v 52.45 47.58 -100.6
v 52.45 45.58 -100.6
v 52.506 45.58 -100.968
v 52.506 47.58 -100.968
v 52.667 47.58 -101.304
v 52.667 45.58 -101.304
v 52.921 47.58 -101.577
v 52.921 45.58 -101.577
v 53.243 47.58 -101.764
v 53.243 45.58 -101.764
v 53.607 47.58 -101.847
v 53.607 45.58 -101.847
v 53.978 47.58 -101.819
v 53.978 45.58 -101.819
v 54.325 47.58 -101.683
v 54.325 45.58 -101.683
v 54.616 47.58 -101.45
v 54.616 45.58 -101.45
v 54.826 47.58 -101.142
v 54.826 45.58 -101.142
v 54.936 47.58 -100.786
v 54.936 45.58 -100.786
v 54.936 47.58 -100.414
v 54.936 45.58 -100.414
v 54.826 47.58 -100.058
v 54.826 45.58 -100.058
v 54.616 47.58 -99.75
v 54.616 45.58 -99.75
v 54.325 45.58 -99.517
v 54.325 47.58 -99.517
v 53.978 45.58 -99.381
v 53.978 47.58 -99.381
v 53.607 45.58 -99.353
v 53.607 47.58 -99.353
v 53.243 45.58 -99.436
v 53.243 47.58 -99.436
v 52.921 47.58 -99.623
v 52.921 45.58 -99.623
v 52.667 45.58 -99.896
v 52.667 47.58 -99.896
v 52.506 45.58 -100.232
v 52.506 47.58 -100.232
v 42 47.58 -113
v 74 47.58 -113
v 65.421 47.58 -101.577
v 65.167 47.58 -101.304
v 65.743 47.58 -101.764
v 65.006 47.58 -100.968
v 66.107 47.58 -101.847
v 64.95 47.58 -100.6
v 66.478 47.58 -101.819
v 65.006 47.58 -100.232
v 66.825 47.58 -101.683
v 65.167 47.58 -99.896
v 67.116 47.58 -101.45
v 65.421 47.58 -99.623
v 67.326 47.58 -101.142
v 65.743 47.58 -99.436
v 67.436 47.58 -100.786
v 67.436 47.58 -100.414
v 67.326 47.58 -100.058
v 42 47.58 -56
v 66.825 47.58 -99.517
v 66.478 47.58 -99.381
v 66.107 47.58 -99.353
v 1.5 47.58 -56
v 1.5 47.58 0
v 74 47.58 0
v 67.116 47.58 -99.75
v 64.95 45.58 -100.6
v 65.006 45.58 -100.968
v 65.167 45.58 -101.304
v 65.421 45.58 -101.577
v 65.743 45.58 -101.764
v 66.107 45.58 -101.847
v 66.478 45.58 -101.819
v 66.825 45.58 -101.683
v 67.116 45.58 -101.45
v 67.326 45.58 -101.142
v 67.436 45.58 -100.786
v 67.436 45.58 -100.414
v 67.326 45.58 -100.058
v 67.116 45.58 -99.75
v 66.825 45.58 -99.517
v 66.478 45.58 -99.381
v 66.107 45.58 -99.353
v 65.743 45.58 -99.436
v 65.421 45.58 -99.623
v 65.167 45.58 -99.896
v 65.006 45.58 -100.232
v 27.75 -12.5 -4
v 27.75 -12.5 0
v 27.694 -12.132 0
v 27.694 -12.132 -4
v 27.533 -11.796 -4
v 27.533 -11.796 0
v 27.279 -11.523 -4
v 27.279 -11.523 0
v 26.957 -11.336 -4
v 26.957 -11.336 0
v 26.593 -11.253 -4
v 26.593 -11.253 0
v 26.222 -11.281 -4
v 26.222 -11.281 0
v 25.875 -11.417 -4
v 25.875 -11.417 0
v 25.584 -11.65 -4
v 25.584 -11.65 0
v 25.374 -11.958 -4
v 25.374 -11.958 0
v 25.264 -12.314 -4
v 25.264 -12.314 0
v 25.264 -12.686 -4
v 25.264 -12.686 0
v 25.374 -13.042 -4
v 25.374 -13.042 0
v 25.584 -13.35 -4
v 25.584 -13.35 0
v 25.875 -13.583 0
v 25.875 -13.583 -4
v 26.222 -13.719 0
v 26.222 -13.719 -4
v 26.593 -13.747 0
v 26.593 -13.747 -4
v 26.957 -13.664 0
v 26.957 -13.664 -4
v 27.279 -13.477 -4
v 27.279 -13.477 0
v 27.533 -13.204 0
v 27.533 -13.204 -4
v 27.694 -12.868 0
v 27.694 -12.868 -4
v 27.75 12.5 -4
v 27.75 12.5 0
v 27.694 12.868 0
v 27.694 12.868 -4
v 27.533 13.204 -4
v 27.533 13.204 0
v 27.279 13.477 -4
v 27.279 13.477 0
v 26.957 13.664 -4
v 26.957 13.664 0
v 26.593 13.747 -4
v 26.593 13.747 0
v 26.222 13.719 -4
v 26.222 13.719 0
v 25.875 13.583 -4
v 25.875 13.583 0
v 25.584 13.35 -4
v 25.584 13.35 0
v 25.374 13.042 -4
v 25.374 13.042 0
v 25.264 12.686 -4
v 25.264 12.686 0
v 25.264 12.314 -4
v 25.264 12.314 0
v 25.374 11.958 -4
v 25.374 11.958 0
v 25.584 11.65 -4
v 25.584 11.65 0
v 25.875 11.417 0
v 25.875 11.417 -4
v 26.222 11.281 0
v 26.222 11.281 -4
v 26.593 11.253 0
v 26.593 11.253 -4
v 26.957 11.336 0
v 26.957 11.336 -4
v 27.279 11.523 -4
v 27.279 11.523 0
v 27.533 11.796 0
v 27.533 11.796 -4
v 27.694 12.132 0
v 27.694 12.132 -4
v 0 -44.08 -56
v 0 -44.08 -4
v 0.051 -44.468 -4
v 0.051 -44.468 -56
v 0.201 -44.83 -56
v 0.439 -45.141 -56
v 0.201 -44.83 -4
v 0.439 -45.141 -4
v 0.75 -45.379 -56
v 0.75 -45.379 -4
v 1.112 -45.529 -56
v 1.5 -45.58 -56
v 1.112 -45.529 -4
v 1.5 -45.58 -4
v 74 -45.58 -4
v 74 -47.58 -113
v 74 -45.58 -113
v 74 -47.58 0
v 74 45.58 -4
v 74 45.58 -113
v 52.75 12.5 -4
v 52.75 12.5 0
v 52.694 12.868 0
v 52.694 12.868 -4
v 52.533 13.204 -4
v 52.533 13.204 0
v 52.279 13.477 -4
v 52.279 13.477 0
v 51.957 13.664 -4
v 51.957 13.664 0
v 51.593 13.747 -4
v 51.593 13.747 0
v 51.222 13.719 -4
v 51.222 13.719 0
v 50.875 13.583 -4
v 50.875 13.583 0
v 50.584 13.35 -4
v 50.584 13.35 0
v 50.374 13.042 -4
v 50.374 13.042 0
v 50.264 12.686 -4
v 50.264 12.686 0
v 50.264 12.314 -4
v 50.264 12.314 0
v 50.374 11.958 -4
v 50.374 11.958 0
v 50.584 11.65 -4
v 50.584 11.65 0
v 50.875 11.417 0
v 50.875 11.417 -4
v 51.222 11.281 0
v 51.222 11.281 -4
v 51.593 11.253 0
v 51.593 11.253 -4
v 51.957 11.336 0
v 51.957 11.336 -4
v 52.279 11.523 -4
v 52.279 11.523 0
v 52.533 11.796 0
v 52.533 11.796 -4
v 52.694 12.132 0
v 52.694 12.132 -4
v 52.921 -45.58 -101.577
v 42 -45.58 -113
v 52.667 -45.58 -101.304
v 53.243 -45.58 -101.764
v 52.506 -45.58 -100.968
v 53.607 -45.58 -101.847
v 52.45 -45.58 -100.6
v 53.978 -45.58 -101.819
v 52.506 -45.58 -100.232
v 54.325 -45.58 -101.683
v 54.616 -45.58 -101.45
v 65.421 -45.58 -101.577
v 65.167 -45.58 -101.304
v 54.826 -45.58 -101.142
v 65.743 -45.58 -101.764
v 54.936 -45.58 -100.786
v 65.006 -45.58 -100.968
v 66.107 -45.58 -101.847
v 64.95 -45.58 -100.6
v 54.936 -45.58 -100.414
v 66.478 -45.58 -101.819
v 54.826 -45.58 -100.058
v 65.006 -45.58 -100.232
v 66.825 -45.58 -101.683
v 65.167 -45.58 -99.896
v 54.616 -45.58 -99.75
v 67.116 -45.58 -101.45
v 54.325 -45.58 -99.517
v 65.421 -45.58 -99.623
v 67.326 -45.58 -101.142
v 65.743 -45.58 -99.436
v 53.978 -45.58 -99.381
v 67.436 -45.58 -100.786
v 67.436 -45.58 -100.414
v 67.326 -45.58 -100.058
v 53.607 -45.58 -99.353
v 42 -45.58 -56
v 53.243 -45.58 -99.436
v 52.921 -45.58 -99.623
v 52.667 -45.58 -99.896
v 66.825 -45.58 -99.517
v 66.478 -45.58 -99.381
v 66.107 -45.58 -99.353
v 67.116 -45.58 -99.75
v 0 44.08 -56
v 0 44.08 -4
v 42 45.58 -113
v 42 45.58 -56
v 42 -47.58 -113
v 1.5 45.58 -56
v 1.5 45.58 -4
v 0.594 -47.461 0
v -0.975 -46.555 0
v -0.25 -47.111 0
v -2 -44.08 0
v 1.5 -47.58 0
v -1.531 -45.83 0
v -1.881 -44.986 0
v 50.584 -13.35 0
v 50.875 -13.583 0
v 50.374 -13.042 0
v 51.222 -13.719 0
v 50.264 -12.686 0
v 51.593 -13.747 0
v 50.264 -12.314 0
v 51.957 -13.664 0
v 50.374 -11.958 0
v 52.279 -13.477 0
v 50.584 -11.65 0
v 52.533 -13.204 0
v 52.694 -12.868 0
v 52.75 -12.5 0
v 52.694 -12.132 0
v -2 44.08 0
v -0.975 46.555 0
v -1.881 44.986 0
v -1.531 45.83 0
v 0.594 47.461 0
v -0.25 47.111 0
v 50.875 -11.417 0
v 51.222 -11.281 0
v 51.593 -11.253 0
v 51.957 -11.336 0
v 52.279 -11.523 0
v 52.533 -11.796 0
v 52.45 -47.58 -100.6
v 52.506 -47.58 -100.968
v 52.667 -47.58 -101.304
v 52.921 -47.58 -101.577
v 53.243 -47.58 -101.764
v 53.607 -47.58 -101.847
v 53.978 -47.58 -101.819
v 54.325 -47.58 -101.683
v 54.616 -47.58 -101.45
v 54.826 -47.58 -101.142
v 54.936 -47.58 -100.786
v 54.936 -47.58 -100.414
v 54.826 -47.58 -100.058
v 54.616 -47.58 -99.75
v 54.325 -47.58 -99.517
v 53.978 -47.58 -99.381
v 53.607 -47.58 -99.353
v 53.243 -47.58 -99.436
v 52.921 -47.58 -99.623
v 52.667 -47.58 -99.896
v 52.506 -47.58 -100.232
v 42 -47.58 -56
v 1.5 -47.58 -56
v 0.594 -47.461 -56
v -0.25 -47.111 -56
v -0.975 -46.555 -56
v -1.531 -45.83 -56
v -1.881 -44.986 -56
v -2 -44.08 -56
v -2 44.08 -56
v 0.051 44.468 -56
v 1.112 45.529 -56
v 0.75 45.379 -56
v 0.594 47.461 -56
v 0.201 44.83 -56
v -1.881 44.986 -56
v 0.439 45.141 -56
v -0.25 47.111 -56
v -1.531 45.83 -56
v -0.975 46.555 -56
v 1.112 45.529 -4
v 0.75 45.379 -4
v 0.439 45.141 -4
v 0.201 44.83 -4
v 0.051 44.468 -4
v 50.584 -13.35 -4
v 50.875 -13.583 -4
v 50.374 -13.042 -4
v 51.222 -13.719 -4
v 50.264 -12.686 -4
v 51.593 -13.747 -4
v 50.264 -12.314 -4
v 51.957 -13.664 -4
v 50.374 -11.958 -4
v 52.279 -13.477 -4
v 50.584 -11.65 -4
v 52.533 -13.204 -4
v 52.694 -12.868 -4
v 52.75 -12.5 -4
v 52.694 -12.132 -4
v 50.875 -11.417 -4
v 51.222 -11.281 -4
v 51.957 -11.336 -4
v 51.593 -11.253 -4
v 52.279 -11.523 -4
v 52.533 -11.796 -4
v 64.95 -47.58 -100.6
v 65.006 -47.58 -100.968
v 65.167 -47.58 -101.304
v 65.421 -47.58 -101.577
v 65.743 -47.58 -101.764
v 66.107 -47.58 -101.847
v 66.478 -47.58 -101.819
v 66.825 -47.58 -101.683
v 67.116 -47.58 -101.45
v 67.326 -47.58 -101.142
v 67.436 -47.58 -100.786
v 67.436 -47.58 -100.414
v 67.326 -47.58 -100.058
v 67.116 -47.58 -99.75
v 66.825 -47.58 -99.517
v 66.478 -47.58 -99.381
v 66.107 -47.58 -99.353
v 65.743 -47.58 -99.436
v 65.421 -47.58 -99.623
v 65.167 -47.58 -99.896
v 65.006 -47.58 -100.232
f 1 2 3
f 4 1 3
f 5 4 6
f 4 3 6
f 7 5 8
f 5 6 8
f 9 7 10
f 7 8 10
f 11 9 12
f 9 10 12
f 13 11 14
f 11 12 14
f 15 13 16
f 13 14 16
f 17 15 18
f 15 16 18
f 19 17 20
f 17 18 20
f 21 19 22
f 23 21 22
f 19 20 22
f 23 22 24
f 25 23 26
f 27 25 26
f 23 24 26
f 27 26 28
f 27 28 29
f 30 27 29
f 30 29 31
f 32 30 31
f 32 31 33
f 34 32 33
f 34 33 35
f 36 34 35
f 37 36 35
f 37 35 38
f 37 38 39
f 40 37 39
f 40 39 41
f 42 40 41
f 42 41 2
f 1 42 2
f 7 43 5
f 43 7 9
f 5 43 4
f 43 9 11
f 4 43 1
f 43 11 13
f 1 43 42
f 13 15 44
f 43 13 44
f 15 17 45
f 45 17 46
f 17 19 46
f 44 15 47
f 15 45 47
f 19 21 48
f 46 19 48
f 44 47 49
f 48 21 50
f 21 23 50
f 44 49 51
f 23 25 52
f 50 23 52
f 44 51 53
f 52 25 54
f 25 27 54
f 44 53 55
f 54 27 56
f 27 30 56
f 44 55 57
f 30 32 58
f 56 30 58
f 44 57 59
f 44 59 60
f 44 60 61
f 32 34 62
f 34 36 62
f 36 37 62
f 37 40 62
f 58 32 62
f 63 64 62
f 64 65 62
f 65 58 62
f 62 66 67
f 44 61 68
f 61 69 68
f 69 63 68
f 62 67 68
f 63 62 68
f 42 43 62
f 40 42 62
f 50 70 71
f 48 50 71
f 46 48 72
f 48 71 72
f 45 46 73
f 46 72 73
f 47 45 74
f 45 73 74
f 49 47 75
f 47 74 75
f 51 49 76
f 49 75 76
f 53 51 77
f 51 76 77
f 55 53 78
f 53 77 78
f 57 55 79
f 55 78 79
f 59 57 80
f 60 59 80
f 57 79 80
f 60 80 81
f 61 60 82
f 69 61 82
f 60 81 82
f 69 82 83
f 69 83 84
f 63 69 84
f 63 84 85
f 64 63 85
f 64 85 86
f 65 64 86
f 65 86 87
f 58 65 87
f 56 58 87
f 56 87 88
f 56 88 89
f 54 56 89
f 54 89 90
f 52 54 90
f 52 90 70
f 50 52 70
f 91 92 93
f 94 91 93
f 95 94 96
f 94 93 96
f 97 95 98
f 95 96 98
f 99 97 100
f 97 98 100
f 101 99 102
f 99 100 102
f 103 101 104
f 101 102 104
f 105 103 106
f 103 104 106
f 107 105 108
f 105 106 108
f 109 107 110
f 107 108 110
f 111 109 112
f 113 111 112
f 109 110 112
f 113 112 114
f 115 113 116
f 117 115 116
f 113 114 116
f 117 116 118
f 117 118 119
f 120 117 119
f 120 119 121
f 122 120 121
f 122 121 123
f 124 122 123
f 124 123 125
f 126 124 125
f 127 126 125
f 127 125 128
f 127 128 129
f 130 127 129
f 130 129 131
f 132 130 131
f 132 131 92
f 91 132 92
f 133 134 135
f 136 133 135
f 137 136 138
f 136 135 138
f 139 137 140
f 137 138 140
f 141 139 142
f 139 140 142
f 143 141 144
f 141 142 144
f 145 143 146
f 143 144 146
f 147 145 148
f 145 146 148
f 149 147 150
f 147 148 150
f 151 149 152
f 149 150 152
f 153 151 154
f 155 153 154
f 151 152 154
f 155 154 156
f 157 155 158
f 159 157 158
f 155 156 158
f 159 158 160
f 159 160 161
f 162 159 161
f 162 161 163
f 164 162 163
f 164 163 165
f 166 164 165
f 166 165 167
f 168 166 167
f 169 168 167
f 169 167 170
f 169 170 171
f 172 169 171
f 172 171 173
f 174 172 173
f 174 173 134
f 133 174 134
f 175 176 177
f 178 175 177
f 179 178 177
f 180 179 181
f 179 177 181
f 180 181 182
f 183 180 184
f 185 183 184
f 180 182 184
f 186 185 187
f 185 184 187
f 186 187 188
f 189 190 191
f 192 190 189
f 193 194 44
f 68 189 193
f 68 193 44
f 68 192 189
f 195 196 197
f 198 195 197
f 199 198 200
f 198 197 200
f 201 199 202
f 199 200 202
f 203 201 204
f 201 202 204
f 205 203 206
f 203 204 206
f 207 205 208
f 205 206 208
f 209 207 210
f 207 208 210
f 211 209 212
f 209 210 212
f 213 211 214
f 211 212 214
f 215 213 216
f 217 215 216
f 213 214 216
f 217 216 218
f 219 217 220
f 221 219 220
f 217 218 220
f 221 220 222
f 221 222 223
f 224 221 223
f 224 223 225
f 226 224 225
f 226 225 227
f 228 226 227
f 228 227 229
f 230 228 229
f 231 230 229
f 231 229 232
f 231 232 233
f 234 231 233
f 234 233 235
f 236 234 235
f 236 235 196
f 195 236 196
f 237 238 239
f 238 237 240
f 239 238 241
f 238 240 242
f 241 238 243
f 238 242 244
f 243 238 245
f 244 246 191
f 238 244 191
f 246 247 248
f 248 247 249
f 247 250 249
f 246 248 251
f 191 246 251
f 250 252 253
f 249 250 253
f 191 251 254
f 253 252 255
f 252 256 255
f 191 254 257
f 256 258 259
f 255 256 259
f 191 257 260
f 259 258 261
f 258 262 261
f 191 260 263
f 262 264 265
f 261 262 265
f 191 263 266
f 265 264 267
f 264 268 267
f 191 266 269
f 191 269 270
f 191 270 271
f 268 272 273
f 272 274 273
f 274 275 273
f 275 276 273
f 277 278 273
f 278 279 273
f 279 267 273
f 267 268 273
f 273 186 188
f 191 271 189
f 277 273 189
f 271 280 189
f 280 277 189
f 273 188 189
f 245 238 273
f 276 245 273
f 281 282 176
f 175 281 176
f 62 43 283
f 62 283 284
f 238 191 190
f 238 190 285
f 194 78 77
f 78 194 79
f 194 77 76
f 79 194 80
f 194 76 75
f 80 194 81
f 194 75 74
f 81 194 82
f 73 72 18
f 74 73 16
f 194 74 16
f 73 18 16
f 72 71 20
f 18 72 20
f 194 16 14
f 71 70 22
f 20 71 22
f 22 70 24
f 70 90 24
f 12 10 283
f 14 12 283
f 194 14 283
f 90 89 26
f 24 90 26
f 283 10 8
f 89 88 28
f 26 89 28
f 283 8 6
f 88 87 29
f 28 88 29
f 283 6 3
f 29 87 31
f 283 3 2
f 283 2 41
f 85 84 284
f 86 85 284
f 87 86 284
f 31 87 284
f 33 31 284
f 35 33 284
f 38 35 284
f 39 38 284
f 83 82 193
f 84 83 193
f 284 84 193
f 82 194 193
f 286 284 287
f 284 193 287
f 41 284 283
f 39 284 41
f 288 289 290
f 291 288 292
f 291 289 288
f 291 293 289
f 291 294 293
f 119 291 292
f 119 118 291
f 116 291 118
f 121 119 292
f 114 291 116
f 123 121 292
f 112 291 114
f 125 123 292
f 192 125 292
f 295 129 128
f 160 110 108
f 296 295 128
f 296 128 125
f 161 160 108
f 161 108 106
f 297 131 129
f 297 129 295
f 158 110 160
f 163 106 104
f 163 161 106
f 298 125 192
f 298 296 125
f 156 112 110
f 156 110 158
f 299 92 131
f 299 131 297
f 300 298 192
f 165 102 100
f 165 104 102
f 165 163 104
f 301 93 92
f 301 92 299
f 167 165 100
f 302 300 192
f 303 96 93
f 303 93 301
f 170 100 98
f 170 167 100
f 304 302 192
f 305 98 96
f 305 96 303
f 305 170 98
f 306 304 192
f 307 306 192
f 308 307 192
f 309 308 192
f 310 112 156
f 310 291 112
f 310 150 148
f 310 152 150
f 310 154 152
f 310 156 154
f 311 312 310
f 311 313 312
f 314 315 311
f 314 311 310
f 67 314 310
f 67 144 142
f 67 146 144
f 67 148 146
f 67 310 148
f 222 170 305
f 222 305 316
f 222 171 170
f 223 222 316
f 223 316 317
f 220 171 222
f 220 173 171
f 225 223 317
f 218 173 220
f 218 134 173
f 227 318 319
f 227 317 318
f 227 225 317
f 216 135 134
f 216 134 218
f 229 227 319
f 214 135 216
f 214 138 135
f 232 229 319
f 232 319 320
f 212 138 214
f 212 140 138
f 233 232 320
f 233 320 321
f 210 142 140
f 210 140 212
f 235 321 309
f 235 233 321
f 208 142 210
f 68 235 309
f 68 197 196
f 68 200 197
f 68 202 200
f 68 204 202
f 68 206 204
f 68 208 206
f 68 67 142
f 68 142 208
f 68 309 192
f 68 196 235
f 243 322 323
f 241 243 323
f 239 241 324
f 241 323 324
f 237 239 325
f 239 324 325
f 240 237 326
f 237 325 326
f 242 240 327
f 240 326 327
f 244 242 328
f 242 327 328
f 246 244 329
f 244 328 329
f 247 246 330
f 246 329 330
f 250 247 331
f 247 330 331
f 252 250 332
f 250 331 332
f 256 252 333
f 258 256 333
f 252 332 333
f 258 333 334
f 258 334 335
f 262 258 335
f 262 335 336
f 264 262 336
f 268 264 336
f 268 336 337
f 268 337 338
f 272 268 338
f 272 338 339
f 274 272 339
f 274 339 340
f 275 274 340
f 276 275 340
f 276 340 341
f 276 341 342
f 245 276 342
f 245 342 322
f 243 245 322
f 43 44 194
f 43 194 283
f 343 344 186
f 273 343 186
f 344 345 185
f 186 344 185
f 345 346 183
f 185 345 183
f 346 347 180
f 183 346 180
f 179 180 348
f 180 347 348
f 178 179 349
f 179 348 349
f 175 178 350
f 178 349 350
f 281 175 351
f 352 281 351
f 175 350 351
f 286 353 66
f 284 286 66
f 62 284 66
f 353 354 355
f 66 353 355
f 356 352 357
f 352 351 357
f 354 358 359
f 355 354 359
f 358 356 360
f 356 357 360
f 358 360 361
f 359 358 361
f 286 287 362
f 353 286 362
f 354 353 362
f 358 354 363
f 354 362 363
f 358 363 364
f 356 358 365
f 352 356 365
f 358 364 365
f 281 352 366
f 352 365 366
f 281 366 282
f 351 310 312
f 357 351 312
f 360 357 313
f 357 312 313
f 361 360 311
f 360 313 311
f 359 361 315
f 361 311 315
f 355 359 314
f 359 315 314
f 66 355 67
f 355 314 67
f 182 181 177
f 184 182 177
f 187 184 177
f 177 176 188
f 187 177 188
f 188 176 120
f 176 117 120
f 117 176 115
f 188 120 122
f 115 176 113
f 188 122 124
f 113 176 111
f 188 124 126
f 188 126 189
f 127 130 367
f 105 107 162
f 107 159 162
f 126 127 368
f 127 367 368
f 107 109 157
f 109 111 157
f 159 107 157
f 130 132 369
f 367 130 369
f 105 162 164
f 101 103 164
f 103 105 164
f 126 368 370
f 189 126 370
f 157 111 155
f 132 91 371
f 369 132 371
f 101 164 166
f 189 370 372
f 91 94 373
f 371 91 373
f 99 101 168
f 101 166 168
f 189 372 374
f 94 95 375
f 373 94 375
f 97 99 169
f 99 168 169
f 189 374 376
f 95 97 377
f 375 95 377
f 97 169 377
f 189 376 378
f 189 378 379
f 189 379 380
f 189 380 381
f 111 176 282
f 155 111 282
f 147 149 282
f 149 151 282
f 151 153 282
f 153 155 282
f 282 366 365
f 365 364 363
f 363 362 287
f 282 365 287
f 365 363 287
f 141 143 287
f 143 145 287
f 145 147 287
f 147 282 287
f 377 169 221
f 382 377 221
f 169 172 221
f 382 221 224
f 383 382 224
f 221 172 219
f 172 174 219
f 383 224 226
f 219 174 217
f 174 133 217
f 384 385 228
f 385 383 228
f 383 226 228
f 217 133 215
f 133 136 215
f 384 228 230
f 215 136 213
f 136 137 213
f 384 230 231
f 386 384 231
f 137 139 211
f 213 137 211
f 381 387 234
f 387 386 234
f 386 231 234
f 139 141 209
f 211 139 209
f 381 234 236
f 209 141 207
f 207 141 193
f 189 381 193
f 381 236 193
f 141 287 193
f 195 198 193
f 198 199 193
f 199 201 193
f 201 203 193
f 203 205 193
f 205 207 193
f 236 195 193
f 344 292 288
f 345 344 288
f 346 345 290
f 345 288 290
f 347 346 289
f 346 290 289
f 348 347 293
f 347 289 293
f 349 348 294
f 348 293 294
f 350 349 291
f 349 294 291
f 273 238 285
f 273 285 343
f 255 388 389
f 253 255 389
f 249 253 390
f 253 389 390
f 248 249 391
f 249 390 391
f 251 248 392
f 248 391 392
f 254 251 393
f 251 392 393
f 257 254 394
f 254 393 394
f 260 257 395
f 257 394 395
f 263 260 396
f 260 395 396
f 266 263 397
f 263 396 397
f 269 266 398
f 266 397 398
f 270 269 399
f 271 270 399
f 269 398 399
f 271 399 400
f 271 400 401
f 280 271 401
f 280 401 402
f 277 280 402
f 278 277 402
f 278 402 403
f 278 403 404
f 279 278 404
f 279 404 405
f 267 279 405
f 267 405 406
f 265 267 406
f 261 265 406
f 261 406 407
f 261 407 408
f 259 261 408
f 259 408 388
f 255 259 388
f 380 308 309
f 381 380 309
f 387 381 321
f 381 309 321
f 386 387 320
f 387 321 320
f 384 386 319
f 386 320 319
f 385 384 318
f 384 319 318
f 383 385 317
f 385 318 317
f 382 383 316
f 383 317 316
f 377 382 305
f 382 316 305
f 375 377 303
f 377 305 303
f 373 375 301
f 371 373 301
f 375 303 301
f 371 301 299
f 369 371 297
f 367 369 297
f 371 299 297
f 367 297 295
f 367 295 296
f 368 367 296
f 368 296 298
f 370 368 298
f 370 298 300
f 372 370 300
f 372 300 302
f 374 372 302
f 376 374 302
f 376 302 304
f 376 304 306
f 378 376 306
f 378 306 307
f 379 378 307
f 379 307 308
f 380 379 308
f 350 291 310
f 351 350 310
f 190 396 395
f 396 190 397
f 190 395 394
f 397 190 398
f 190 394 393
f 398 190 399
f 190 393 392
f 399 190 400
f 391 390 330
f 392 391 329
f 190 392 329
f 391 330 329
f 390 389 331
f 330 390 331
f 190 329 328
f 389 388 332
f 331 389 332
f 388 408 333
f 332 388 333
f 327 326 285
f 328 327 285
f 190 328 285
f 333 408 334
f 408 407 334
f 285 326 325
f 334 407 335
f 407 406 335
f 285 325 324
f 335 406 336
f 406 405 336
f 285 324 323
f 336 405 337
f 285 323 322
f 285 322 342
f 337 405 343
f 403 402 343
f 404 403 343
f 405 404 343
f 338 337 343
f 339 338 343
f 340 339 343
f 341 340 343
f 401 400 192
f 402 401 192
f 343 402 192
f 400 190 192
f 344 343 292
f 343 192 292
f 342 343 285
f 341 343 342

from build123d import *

# Parameters (mm, degrees)
SM_BASE_FLANGE_1_DEPTH = 113
EXTRUDE_1_DEPTH        = 4
HOLE_WIZARD_M3_1_D     = 2.5
SKETCH_11_W            = 71.5874944
SKETCH_11_H            = 95.16
CUT_EXTRUDE_1_DEPTH    = 44
HOLE_WIZARD_M3_2_D     = 2.5


# Sheet-metal steps are written as plain solids
with BuildPart() as part:
    # Sketch 2 → 基体-法兰1 (new body)
    with BuildSketch(Plane.XY):
        with BuildLine():
            Line((74, 45.58), (1.5, 45.58))
            ThreePointArc((1.5, 45.58), (0.439339828, 45.140660172), (0, 44.08))
            Line((0, 44.08), (0, -44.08))
            ThreePointArc((0, -44.08), (0.439339828, -45.140660172), (1.5, -45.58))
            Line((1.5, -45.58), (74, -45.58))
            Line((74, -45.58), (74, -47.58))
            Line((74, -47.58), (1.5, -47.58))
            ThreePointArc((1.5, -47.58), (-0.974873734, -46.554873734), (-2, -44.08))
            Line((-2, -44.08), (-2, 44.08))
            ThreePointArc((-2, 44.08), (-0.974873734, 46.554873734), (1.5, 47.58))
            Line((1.5, 47.58), (74, 47.58))
            Line((74, 47.58), (74, 45.58))
        make_face()
    extrude(amount=-SM_BASE_FLANGE_1_DEPTH)

    # 草图7 → 凸台-拉伸1 (add)
    with BuildSketch(Plane.XY):
        with BuildLine():
            Line((74, 45.58), (1.5, 45.58))
            ThreePointArc((1.5, 45.58), (0.439339828, 45.140660172), (0, 44.08))
            Line((0, 44.08), (0, -44.08))
            ThreePointArc((0, -44.08), (0.439339828, -45.140660172), (1.5, -45.58))
            Line((1.5, -45.58), (74, -45.58))
            Line((74, -45.58), (74, 45.58))
        make_face()
    extrude(amount=-EXTRUDE_1_DEPTH)

    # M3 螺纹孔1 (through all)
    with Locations(Plane(origin=(0, 47.58, 0), x_dir=(1, 0, 0), z_dir=(0, 1, 0))):
        with Locations((53.7, 100.6), (66.2, 100.6)):
            Hole(HOLE_WIZARD_M3_1_D / 2)

    # 草图11 → 切除-拉伸1 (cut)
    with BuildSketch(Plane.ZY.offset(2)):
        with Locations((-91.7937472, 0)):
            Rectangle(SKETCH_11_W, SKETCH_11_H)
    extrude(amount=-CUT_EXTRUDE_1_DEPTH, mode=Mode.SUBTRACT)

    # M3 螺纹孔2 (through all)
    with Locations(Plane(origin=(0, 0, -4), x_dir=(-1, 0, 0), z_dir=(0, 0, -1))):
        with Locations((-51.5, 12.5), (-26.5, 12.5), (-26.5, -12.5), (-51.5, -12.5)):
            Hole(HOLE_WIZARD_M3_2_D / 2)


solid = part.part
